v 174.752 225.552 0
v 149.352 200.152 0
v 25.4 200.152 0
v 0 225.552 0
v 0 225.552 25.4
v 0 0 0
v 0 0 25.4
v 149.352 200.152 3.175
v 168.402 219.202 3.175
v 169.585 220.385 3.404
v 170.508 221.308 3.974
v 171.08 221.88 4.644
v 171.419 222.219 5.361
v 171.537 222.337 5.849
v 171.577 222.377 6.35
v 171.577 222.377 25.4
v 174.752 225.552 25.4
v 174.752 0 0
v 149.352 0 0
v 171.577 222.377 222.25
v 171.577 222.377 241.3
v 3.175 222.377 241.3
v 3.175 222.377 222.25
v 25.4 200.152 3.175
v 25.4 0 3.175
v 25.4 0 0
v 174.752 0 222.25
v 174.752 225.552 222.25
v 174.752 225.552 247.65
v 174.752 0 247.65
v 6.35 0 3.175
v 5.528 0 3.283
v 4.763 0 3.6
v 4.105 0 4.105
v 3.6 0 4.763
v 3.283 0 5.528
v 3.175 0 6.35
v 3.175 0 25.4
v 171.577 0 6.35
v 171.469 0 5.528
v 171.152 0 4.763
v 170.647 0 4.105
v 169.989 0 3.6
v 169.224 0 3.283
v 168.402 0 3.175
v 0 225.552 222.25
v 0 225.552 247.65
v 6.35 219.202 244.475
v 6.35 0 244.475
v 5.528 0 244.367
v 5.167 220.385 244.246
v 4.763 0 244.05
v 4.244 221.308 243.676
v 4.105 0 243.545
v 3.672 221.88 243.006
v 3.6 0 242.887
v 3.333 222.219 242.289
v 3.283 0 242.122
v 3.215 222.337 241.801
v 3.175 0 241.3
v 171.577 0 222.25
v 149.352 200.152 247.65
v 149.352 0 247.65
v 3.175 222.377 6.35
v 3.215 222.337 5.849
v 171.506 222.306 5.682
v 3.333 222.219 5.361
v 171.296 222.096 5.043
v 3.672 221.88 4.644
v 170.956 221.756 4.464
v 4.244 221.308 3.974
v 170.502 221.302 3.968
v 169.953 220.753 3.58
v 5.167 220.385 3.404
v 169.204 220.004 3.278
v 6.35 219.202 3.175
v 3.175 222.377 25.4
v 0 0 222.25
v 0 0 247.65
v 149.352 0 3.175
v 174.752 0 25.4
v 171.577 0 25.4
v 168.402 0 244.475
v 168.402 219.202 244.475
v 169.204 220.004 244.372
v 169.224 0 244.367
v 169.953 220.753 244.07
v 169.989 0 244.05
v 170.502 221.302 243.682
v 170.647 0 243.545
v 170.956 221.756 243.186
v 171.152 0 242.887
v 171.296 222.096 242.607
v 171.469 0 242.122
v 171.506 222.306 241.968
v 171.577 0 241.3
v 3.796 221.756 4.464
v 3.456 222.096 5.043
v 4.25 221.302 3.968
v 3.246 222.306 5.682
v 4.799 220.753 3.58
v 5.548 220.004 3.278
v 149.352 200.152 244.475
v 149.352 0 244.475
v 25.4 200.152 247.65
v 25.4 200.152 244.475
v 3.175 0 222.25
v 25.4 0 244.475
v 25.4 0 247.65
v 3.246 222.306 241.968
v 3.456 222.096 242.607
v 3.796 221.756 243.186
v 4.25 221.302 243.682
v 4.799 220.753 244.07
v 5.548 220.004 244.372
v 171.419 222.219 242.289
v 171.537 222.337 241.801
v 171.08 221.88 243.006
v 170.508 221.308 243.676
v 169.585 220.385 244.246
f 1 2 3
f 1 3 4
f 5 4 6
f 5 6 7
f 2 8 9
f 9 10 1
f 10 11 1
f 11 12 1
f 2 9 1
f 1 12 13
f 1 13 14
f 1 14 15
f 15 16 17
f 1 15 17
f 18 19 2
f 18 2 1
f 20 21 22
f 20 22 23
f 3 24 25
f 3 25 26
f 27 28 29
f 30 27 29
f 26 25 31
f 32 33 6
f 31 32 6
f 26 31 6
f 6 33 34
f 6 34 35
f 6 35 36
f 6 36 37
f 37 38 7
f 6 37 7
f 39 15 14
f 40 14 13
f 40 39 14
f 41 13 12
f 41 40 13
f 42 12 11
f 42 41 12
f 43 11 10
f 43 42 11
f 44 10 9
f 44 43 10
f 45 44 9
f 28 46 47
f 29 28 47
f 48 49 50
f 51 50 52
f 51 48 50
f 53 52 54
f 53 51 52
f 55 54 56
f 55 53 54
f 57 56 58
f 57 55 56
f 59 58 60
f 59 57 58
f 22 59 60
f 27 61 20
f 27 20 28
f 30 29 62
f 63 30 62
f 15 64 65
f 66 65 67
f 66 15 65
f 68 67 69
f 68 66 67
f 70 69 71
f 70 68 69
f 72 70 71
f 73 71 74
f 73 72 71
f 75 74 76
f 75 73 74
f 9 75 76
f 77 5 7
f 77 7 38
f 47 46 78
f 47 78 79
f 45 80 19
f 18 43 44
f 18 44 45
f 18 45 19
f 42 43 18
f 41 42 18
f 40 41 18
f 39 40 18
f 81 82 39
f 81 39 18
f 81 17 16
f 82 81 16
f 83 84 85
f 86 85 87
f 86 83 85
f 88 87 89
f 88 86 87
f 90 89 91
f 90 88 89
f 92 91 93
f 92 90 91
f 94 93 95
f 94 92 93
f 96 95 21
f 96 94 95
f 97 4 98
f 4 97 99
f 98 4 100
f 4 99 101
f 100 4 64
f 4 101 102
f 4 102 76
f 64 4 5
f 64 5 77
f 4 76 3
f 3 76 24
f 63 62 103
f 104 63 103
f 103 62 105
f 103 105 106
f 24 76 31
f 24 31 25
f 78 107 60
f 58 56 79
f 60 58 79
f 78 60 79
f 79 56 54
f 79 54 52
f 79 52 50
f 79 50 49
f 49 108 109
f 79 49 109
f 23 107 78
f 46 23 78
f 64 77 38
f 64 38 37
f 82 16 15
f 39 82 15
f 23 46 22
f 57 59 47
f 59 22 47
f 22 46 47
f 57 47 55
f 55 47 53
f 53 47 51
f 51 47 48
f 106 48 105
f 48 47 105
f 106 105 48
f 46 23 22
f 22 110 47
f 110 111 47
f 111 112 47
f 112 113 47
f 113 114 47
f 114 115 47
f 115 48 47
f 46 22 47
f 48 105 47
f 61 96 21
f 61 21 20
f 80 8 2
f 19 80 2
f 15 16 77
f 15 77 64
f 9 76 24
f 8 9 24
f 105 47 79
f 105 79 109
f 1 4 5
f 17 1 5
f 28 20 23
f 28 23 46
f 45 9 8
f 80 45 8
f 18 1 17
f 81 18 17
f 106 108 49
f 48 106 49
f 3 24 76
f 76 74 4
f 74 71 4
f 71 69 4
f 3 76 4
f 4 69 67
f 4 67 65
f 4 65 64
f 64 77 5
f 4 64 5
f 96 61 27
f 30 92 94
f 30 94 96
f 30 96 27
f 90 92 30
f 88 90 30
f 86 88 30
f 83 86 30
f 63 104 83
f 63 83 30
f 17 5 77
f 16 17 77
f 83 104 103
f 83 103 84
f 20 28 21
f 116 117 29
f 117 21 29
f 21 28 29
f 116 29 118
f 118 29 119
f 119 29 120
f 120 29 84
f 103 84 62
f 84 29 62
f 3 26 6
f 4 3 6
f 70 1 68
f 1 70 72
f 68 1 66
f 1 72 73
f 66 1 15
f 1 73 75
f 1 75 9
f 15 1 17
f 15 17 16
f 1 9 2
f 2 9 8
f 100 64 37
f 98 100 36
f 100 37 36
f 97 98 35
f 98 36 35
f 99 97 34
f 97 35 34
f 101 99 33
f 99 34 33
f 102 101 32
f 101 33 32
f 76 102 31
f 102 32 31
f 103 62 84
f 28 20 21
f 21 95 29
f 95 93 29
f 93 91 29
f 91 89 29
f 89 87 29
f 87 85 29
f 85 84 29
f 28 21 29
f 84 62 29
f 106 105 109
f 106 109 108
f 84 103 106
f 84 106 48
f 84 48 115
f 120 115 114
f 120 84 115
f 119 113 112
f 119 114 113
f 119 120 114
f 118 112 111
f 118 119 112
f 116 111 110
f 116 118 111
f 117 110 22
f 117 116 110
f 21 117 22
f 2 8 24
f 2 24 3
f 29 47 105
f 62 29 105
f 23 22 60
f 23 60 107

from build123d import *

# Parameters (mm, degrees)
NGULO_DE_EXTREMOS_CUADRADOS_AL_LS_AL_LS_DEPTH       = 262.473024484
NGULO_DE_EXTREMOS_CUADRADOS_AL_LS_AL_3_DEPTH        = 248.594048969
NGULO_DE_EXTREMOS_CUADRADOS_AL_LS_AL_5_DEPTH        = 262.473024484
NGULO_DE_EXTREMOS_CUADRADOS_AL_LS_AL_6_DEPTH        = 262.473024484
NGULO_DE_EXTREMOS_CUADRADOS_AL_LS_AL_6_2_DEPTH      = 248.594048969
NGULO_DE_EXTREMOS_CUADRADOS_AL_LS_AL_6_3_DEPTH      = 36.921024484
NGULO_DE_EXTREMOS_CUADRADOS_AL_LS_AL_6_3_DEPTH_BACK = 225.552


with BuildPart() as part:
    # Sketch1 → ngulo de extremos cuadrados al ls AL LS (new body)
    with BuildSketch(Plane.XZ):
        with BuildLine():
            Line((0, 0), (0, 25.4))
            Line((0, 25.4), (3.175, 25.4))
            Line((3.175, 25.4), (3.175, 6.35))
            ThreePointArc((3.175, 6.35), (4.10493597, 4.10493597), (6.35, 3.175))
            Line((6.35, 3.175), (25.4, 3.175))
            Line((25.4, 3.175), (25.4, 0))
            Line((25.4, 0), (0, 0))
        make_face()
    extrude(amount=-NGULO_DE_EXTREMOS_CUADRADOS_AL_LS_AL_LS_DEPTH)

    # ngulo de extremos cuadrados al ls AL 2
    split(bisect_by=Plane(origin=(0, 225.552, 0), x_dir=(0.707106781, -0.707106781, 0), z_dir=(-0.707106781, -0.707106781, 0)), keep=Keep.TOP)


with BuildPart() as body_2:
    # Sketch1 on segment 2 (carried to segment 2) → ngulo de extremos cuadrados al ls AL 3 (new body)
    with BuildSketch(Plane(origin=(211.673024484, 225.552, 0), x_dir=(0, -1, 0), z_dir=(-1, 0, 0))):
        with BuildLine():
            Line((0, 0), (0, 25.4))
            Line((0, 25.4), (3.175, 25.4))
            Line((3.175, 25.4), (3.175, 6.35))
            ThreePointArc((3.175, 6.35), (4.10493597, 4.10493597), (6.35, 3.175))
            Line((6.35, 3.175), (25.4, 3.175))
            Line((25.4, 3.175), (25.4, 0))
            Line((25.4, 0), (0, 0))
        make_face()
    extrude(amount=NGULO_DE_EXTREMOS_CUADRADOS_AL_LS_AL_3_DEPTH)

    # ngulo de extremos cuadrados al ls AL 3 m
    split(bisect_by=Plane(origin=(0, 225.552, 0), x_dir=(-0.707106781, 0.707106781, 0), z_dir=(0.707106781, 0.707106781, 0)), keep=Keep.TOP)

    # ngulo de extremos cuadrados al ls AL 4
    split(bisect_by=Plane(origin=(174.752, 225.552, 0), x_dir=(-0.707106781, -0.707106781, 0), z_dir=(-0.707106781, 0.707106781, 0)), keep=Keep.TOP)


with BuildPart() as body_3:
    # Sketch1 on segment 3 (carried to segment 3) → ngulo de extremos cuadrados al ls AL 5 (new body)
    with BuildSketch(Plane(origin=(174.752, 0, 0), x_dir=(-1, 0, 0), z_dir=(0, 1, 0))):
        with BuildLine():
            Line((0, 0), (0, 25.4))
            Line((0, 25.4), (3.175, 25.4))
            Line((3.175, 25.4), (3.175, 6.35))
            ThreePointArc((3.175, 6.35), (4.10493597, 4.10493597), (6.35, 3.175))
            Line((6.35, 3.175), (25.4, 3.175))
            Line((25.4, 3.175), (25.4, 0))
            Line((25.4, 0), (0, 0))
        make_face()
    extrude(amount=NGULO_DE_EXTREMOS_CUADRADOS_AL_LS_AL_5_DEPTH)

    # ngulo de extremos cuadrados al ls AL 5 m
    split(bisect_by=Plane(origin=(174.752, 225.552, 0), x_dir=(0.707106781, 0.707106781, 0), z_dir=(0.707106781, -0.707106781, 0)), keep=Keep.TOP)


with BuildPart() as body_4:
    # Sketch12 on segment 1 (carried to segment 1) → ngulo de extremos cuadrados al ls AL 6 (new body)
    with BuildSketch(Plane(origin=(0, 262.473024484, 247.65), x_dir=(0, 0, -1), z_dir=(0, -1, 0))):
        with BuildLine():
            Line((0, 0), (0, 25.4))
            Line((0, 25.4), (3.175, 25.4))
            Line((3.175, 25.4), (3.175, 6.35))
            ThreePointArc((3.175, 6.35), (4.10493597, 4.10493597), (6.35, 3.175))
            Line((6.35, 3.175), (25.4, 3.175))
            Line((25.4, 3.175), (25.4, 0))
            Line((25.4, 0), (0, 0))
        make_face()
    extrude(amount=NGULO_DE_EXTREMOS_CUADRADOS_AL_LS_AL_6_DEPTH)

    # ngulo de extremos cuadrados al ls AL 6 m
    split(bisect_by=Plane(origin=(0, 225.552, 247.65), x_dir=(0.707106781, -0.707106781, 0), z_dir=(-0.707106781, -0.707106781, 0)), keep=Keep.TOP)


with BuildPart() as body_5:
    # Sketch12 on segment 2 (carried to segment 2) → ngulo de extremos cuadrados al ls AL 6 2 (new body)
    with BuildSketch(Plane(origin=(211.673024484, 225.552, 247.65), x_dir=(0, 0, -1), z_dir=(-1, 0, 0))):
        with BuildLine():
            Line((0, 0), (0, 25.4))
            Line((0, 25.4), (3.175, 25.4))
            Line((3.175, 25.4), (3.175, 6.35))
            ThreePointArc((3.175, 6.35), (4.10493597, 4.10493597), (6.35, 3.175))
            Line((6.35, 3.175), (25.4, 3.175))
            Line((25.4, 3.175), (25.4, 0))
            Line((25.4, 0), (0, 0))
        make_face()
    extrude(amount=NGULO_DE_EXTREMOS_CUADRADOS_AL_LS_AL_6_2_DEPTH)

    # ngulo de extremos cuadrados al ls AL 7
    split(bisect_by=Plane(origin=(0, 225.552, 247.65), x_dir=(-0.707106781, 0.707106781, 0), z_dir=(0.707106781, 0.707106781, 0)), keep=Keep.TOP)

    # ngulo de extremos cuadrados al ls AL 8
    split(bisect_by=Plane(origin=(174.752, 225.552, 247.65), x_dir=(-0.707106781, -0.707106781, 0), z_dir=(-0.707106781, 0.707106781, 0)), keep=Keep.TOP)


with BuildPart() as body_6:
    # Sketch12 → ngulo de extremos cuadrados al ls AL 6 3 (new, two sides: drawn at the far end of the back side and taken through both)
    with BuildSketch(Plane(origin=(174.752, 225.552, 247.65), x_dir=(0, 0, -1), z_dir=(0, 1, 0)).offset(-NGULO_DE_EXTREMOS_CUADRADOS_AL_LS_AL_6_3_DEPTH_BACK)):
        with BuildLine():
            Line((0, 0), (0, 25.4))
            Line((0, 25.4), (3.175, 25.4))
            Line((3.175, 25.4), (3.175, 6.35))
            ThreePointArc((3.175, 6.35), (4.10493597, 4.10493597), (6.35, 3.175))
            Line((6.35, 3.175), (25.4, 3.175))
            Line((25.4, 3.175), (25.4, 0))
            Line((25.4, 0), (0, 0))
        make_face()
    extrude(amount=NGULO_DE_EXTREMOS_CUADRADOS_AL_LS_AL_6_3_DEPTH + NGULO_DE_EXTREMOS_CUADRADOS_AL_LS_AL_6_3_DEPTH_BACK)

    # ngulo de extremos cuadrados al ls AL 9
    split(bisect_by=Plane(origin=(174.752, 225.552, 247.65), x_dir=(0.707106781, 0.707106781, 0), z_dir=(0.707106781, -0.707106781, 0)), keep=Keep.TOP)


solid = Compound([part.part, body_2.part, body_3.part, body_4.part, body_5.part, body_6.part])
